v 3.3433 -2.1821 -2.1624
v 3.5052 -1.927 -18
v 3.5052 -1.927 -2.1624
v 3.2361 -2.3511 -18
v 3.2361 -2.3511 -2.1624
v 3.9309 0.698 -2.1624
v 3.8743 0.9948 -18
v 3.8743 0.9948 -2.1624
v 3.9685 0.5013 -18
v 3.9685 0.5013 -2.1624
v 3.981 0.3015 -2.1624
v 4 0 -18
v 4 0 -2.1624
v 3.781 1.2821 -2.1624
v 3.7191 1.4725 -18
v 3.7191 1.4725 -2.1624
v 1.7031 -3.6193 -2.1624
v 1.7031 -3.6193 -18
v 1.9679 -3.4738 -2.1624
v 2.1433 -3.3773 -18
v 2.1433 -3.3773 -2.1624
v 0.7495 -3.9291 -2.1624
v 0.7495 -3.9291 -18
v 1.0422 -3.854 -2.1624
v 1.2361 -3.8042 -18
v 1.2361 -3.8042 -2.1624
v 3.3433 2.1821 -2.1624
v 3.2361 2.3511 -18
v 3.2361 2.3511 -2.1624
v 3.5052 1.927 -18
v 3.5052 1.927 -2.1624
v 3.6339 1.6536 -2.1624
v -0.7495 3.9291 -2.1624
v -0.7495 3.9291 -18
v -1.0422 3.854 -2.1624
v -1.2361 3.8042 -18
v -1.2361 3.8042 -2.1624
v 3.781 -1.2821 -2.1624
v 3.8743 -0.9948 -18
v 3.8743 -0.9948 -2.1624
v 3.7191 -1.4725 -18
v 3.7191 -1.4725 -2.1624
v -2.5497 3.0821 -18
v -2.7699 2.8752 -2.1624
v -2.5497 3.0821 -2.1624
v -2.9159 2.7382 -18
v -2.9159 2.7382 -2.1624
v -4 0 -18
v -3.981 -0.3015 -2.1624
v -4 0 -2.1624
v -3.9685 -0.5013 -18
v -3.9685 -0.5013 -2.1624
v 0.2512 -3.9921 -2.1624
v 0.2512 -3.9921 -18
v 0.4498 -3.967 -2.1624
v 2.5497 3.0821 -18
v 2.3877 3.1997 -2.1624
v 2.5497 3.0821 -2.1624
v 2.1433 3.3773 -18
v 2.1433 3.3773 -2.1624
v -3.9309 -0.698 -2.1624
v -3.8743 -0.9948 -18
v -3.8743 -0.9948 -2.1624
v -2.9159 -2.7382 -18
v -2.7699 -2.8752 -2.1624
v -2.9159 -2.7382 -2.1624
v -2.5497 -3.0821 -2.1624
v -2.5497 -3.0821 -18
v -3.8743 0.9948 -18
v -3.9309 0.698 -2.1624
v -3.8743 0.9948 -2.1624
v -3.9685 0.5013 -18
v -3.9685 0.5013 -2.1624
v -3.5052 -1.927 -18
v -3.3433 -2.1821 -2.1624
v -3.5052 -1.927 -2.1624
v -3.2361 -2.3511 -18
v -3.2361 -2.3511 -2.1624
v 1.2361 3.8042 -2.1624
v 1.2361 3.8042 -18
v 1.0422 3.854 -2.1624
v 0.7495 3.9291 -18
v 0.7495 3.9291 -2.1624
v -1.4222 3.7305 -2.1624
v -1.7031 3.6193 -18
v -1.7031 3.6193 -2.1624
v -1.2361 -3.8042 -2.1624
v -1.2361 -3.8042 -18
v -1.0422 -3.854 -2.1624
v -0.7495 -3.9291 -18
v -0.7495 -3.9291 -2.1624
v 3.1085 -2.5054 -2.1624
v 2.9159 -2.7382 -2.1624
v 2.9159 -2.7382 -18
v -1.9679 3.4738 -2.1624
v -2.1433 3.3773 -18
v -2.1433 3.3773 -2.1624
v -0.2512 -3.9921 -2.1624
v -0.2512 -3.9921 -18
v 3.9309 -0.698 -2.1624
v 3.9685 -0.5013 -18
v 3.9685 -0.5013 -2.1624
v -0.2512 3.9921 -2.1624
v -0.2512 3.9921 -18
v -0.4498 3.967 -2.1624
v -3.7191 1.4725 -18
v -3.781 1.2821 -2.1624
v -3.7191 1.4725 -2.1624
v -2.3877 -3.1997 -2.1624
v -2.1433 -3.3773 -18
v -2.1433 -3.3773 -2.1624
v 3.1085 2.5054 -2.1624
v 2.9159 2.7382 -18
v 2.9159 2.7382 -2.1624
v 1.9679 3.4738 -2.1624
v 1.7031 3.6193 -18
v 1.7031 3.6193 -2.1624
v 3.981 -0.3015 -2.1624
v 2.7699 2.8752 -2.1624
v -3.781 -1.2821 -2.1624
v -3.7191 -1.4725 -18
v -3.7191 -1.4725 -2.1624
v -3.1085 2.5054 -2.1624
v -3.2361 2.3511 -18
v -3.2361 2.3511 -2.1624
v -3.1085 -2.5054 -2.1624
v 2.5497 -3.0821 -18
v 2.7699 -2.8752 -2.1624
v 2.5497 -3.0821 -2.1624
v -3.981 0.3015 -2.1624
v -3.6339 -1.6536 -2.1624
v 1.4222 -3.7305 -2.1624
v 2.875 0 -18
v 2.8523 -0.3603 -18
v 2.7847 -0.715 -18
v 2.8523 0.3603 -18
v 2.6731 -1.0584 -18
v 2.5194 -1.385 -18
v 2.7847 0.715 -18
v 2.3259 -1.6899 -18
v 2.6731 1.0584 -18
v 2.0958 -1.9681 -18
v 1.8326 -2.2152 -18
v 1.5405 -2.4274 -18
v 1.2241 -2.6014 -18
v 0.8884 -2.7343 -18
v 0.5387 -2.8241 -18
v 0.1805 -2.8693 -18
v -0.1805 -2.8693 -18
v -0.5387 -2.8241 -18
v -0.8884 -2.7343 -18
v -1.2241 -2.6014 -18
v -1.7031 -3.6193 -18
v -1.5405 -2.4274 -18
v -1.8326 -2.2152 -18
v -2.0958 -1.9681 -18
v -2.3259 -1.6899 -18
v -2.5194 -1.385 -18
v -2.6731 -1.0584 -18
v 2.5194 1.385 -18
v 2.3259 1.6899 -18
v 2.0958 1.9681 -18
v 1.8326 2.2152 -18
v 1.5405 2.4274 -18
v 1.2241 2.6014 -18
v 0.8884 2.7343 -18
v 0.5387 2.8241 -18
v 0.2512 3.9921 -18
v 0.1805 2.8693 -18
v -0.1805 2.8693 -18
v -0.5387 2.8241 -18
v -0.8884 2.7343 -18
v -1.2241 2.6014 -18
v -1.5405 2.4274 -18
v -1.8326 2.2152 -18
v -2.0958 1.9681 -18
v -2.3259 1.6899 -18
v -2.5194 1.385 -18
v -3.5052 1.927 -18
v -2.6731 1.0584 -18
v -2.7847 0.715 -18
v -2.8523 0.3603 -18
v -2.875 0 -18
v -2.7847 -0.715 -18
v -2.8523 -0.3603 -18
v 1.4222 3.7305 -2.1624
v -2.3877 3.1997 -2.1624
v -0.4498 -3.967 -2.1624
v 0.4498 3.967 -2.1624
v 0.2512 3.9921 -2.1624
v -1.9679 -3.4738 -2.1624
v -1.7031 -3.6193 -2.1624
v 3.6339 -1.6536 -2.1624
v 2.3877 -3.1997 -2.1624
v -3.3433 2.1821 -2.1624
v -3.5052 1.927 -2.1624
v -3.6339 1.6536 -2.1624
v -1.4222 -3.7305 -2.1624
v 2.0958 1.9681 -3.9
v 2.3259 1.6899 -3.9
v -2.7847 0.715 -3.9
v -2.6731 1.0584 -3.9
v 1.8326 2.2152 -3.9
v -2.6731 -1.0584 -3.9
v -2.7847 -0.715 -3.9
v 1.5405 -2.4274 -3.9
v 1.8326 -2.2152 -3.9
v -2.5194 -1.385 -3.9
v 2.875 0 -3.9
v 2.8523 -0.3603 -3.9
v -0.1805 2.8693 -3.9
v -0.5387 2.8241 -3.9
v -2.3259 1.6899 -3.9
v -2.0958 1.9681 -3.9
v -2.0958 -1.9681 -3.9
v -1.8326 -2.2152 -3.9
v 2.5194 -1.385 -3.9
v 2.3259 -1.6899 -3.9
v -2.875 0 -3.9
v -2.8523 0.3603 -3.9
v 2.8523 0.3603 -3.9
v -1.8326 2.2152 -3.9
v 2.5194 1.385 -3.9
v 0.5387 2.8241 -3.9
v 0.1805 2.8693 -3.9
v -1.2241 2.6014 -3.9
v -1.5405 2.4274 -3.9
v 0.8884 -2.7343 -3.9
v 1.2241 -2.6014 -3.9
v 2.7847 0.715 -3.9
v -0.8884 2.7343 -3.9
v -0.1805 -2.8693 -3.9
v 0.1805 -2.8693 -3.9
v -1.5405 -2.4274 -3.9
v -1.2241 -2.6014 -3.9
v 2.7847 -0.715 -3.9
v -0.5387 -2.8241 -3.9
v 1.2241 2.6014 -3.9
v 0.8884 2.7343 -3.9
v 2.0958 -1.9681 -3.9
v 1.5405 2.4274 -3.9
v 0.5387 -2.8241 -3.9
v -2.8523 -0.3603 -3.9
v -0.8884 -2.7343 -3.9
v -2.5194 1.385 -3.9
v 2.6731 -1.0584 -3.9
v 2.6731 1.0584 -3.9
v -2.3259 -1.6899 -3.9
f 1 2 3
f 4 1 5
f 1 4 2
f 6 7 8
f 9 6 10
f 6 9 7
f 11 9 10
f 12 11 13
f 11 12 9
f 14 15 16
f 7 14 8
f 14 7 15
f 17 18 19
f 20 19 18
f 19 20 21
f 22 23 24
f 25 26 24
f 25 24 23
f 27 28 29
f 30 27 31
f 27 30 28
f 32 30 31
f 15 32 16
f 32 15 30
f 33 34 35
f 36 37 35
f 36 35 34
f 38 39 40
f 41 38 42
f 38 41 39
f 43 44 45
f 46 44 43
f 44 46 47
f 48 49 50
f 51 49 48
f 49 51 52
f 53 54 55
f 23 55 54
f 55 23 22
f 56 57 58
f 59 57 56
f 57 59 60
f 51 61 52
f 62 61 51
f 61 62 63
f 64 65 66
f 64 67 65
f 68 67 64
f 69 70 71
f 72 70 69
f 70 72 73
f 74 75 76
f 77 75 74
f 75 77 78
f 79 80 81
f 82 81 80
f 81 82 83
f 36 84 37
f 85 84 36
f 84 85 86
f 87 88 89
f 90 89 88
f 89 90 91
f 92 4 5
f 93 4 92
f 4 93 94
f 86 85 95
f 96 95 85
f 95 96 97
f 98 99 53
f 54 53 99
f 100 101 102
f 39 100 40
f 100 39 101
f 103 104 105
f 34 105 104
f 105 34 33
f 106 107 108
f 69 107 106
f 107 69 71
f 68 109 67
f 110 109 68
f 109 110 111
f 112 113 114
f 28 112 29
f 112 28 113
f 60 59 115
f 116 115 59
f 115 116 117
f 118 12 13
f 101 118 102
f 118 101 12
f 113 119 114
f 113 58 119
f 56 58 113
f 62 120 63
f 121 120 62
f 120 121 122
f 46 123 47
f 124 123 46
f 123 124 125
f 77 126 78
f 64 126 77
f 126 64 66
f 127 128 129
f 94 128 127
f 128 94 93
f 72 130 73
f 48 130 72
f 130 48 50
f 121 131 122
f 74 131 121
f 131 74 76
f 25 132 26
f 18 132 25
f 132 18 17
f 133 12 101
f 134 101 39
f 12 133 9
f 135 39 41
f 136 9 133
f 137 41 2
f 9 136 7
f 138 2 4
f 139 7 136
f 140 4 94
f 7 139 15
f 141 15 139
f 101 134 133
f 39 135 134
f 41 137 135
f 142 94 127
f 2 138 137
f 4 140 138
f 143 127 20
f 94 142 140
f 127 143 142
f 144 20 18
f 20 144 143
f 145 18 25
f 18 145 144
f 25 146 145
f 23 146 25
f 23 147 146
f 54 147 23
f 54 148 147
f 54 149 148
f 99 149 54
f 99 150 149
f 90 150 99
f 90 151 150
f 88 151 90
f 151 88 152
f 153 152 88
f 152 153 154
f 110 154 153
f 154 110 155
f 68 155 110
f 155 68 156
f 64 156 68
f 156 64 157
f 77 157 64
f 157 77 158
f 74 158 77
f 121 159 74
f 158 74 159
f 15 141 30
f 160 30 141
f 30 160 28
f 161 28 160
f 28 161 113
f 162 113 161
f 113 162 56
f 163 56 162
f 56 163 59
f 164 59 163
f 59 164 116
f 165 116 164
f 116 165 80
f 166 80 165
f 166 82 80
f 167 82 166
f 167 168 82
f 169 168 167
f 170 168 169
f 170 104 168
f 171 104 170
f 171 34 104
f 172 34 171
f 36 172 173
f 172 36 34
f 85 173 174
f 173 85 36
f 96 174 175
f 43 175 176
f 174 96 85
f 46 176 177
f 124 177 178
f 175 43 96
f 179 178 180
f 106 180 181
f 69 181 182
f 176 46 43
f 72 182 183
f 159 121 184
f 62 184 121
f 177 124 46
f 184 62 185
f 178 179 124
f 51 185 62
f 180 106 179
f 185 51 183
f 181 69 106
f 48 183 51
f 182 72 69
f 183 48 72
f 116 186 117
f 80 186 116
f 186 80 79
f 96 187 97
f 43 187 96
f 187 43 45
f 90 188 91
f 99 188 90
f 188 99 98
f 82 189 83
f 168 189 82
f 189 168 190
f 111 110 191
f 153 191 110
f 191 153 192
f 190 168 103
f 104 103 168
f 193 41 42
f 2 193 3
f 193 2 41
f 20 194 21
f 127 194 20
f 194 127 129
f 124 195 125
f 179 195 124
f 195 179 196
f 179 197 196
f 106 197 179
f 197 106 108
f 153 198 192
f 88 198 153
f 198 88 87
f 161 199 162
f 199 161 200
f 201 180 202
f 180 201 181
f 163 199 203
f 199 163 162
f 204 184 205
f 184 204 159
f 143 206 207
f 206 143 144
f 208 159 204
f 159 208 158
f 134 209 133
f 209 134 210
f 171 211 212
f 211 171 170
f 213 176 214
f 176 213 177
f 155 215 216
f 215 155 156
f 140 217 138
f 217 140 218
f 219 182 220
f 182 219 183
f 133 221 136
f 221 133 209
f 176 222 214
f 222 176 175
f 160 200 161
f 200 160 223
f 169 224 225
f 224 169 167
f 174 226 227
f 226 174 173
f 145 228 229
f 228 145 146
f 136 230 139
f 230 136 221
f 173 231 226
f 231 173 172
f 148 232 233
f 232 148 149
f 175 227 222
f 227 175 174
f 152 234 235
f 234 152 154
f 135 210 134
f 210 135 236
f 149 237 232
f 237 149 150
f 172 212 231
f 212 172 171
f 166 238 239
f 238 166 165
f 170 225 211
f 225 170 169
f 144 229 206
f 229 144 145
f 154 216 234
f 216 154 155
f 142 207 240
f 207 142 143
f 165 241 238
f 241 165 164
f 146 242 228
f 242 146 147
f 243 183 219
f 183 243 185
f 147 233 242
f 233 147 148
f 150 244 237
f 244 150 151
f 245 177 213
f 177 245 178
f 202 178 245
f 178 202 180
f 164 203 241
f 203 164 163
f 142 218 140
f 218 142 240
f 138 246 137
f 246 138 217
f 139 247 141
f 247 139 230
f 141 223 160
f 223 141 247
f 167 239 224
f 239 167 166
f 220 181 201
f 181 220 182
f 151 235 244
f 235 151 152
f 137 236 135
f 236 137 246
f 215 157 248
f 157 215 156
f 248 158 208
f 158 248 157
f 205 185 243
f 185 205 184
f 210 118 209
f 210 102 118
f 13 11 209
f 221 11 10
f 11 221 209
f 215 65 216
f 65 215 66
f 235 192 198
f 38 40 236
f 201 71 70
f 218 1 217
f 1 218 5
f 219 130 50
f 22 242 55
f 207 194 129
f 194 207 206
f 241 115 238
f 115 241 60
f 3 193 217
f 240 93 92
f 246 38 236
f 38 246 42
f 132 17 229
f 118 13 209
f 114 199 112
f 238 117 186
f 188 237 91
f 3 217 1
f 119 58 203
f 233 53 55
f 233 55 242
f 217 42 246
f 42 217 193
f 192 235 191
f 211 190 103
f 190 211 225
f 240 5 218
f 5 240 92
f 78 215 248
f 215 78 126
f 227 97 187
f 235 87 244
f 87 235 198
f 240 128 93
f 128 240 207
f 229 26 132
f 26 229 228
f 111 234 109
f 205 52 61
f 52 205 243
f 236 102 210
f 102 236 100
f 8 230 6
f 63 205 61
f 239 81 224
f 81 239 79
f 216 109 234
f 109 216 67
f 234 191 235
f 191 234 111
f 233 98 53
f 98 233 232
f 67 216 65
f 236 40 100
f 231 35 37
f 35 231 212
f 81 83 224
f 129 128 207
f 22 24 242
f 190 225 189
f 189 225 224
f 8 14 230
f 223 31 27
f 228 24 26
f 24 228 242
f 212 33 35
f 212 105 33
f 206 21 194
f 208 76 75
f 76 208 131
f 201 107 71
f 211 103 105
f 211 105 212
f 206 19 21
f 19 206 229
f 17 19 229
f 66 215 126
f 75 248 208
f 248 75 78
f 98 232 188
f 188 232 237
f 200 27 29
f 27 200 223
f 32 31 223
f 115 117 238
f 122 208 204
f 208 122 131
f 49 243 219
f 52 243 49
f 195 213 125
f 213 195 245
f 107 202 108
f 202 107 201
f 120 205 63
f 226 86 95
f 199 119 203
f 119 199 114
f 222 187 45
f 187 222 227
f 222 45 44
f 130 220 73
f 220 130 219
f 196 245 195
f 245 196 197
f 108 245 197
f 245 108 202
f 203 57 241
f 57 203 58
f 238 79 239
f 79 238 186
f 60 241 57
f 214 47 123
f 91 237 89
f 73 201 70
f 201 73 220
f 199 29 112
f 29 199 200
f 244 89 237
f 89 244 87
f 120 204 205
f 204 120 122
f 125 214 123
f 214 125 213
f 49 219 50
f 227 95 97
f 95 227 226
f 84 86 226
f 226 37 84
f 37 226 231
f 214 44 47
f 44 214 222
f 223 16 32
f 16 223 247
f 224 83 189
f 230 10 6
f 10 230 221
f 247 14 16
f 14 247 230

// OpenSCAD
$fn = 50;

difference() {
	union() {
		translate(v = [0, 0, -18.0]) {
			cylinder(h = 18, r = 4.0);
		}
		#translate(v = [0, 0, -21.0]) {
			cylinder(h = 21, r = 2.875);
		}
	}
	union() {
		translate(v = [0, 0, 0]) {
			rotate(a = [0, 0, 0]) {
				difference() {
					union() {
						translate(v = [0, 0, -21.0]) {
							cylinder(h = 21, r = 2.6);
						}
						translate(v = [0, 0, -3.9]) {
							cylinder(h = 3.9, r1 = 2.875, r2 = 5.4);
						}
						translate(v = [0, 0, -21.0]) {
							cylinder(h = 21, r = 2.875);
						}
						translate(v = [0, 0, -21.0]) {
							cylinder(h = 21, r = 2.6);
						}
					}
					union();
				}
			}
		}
	}
}
